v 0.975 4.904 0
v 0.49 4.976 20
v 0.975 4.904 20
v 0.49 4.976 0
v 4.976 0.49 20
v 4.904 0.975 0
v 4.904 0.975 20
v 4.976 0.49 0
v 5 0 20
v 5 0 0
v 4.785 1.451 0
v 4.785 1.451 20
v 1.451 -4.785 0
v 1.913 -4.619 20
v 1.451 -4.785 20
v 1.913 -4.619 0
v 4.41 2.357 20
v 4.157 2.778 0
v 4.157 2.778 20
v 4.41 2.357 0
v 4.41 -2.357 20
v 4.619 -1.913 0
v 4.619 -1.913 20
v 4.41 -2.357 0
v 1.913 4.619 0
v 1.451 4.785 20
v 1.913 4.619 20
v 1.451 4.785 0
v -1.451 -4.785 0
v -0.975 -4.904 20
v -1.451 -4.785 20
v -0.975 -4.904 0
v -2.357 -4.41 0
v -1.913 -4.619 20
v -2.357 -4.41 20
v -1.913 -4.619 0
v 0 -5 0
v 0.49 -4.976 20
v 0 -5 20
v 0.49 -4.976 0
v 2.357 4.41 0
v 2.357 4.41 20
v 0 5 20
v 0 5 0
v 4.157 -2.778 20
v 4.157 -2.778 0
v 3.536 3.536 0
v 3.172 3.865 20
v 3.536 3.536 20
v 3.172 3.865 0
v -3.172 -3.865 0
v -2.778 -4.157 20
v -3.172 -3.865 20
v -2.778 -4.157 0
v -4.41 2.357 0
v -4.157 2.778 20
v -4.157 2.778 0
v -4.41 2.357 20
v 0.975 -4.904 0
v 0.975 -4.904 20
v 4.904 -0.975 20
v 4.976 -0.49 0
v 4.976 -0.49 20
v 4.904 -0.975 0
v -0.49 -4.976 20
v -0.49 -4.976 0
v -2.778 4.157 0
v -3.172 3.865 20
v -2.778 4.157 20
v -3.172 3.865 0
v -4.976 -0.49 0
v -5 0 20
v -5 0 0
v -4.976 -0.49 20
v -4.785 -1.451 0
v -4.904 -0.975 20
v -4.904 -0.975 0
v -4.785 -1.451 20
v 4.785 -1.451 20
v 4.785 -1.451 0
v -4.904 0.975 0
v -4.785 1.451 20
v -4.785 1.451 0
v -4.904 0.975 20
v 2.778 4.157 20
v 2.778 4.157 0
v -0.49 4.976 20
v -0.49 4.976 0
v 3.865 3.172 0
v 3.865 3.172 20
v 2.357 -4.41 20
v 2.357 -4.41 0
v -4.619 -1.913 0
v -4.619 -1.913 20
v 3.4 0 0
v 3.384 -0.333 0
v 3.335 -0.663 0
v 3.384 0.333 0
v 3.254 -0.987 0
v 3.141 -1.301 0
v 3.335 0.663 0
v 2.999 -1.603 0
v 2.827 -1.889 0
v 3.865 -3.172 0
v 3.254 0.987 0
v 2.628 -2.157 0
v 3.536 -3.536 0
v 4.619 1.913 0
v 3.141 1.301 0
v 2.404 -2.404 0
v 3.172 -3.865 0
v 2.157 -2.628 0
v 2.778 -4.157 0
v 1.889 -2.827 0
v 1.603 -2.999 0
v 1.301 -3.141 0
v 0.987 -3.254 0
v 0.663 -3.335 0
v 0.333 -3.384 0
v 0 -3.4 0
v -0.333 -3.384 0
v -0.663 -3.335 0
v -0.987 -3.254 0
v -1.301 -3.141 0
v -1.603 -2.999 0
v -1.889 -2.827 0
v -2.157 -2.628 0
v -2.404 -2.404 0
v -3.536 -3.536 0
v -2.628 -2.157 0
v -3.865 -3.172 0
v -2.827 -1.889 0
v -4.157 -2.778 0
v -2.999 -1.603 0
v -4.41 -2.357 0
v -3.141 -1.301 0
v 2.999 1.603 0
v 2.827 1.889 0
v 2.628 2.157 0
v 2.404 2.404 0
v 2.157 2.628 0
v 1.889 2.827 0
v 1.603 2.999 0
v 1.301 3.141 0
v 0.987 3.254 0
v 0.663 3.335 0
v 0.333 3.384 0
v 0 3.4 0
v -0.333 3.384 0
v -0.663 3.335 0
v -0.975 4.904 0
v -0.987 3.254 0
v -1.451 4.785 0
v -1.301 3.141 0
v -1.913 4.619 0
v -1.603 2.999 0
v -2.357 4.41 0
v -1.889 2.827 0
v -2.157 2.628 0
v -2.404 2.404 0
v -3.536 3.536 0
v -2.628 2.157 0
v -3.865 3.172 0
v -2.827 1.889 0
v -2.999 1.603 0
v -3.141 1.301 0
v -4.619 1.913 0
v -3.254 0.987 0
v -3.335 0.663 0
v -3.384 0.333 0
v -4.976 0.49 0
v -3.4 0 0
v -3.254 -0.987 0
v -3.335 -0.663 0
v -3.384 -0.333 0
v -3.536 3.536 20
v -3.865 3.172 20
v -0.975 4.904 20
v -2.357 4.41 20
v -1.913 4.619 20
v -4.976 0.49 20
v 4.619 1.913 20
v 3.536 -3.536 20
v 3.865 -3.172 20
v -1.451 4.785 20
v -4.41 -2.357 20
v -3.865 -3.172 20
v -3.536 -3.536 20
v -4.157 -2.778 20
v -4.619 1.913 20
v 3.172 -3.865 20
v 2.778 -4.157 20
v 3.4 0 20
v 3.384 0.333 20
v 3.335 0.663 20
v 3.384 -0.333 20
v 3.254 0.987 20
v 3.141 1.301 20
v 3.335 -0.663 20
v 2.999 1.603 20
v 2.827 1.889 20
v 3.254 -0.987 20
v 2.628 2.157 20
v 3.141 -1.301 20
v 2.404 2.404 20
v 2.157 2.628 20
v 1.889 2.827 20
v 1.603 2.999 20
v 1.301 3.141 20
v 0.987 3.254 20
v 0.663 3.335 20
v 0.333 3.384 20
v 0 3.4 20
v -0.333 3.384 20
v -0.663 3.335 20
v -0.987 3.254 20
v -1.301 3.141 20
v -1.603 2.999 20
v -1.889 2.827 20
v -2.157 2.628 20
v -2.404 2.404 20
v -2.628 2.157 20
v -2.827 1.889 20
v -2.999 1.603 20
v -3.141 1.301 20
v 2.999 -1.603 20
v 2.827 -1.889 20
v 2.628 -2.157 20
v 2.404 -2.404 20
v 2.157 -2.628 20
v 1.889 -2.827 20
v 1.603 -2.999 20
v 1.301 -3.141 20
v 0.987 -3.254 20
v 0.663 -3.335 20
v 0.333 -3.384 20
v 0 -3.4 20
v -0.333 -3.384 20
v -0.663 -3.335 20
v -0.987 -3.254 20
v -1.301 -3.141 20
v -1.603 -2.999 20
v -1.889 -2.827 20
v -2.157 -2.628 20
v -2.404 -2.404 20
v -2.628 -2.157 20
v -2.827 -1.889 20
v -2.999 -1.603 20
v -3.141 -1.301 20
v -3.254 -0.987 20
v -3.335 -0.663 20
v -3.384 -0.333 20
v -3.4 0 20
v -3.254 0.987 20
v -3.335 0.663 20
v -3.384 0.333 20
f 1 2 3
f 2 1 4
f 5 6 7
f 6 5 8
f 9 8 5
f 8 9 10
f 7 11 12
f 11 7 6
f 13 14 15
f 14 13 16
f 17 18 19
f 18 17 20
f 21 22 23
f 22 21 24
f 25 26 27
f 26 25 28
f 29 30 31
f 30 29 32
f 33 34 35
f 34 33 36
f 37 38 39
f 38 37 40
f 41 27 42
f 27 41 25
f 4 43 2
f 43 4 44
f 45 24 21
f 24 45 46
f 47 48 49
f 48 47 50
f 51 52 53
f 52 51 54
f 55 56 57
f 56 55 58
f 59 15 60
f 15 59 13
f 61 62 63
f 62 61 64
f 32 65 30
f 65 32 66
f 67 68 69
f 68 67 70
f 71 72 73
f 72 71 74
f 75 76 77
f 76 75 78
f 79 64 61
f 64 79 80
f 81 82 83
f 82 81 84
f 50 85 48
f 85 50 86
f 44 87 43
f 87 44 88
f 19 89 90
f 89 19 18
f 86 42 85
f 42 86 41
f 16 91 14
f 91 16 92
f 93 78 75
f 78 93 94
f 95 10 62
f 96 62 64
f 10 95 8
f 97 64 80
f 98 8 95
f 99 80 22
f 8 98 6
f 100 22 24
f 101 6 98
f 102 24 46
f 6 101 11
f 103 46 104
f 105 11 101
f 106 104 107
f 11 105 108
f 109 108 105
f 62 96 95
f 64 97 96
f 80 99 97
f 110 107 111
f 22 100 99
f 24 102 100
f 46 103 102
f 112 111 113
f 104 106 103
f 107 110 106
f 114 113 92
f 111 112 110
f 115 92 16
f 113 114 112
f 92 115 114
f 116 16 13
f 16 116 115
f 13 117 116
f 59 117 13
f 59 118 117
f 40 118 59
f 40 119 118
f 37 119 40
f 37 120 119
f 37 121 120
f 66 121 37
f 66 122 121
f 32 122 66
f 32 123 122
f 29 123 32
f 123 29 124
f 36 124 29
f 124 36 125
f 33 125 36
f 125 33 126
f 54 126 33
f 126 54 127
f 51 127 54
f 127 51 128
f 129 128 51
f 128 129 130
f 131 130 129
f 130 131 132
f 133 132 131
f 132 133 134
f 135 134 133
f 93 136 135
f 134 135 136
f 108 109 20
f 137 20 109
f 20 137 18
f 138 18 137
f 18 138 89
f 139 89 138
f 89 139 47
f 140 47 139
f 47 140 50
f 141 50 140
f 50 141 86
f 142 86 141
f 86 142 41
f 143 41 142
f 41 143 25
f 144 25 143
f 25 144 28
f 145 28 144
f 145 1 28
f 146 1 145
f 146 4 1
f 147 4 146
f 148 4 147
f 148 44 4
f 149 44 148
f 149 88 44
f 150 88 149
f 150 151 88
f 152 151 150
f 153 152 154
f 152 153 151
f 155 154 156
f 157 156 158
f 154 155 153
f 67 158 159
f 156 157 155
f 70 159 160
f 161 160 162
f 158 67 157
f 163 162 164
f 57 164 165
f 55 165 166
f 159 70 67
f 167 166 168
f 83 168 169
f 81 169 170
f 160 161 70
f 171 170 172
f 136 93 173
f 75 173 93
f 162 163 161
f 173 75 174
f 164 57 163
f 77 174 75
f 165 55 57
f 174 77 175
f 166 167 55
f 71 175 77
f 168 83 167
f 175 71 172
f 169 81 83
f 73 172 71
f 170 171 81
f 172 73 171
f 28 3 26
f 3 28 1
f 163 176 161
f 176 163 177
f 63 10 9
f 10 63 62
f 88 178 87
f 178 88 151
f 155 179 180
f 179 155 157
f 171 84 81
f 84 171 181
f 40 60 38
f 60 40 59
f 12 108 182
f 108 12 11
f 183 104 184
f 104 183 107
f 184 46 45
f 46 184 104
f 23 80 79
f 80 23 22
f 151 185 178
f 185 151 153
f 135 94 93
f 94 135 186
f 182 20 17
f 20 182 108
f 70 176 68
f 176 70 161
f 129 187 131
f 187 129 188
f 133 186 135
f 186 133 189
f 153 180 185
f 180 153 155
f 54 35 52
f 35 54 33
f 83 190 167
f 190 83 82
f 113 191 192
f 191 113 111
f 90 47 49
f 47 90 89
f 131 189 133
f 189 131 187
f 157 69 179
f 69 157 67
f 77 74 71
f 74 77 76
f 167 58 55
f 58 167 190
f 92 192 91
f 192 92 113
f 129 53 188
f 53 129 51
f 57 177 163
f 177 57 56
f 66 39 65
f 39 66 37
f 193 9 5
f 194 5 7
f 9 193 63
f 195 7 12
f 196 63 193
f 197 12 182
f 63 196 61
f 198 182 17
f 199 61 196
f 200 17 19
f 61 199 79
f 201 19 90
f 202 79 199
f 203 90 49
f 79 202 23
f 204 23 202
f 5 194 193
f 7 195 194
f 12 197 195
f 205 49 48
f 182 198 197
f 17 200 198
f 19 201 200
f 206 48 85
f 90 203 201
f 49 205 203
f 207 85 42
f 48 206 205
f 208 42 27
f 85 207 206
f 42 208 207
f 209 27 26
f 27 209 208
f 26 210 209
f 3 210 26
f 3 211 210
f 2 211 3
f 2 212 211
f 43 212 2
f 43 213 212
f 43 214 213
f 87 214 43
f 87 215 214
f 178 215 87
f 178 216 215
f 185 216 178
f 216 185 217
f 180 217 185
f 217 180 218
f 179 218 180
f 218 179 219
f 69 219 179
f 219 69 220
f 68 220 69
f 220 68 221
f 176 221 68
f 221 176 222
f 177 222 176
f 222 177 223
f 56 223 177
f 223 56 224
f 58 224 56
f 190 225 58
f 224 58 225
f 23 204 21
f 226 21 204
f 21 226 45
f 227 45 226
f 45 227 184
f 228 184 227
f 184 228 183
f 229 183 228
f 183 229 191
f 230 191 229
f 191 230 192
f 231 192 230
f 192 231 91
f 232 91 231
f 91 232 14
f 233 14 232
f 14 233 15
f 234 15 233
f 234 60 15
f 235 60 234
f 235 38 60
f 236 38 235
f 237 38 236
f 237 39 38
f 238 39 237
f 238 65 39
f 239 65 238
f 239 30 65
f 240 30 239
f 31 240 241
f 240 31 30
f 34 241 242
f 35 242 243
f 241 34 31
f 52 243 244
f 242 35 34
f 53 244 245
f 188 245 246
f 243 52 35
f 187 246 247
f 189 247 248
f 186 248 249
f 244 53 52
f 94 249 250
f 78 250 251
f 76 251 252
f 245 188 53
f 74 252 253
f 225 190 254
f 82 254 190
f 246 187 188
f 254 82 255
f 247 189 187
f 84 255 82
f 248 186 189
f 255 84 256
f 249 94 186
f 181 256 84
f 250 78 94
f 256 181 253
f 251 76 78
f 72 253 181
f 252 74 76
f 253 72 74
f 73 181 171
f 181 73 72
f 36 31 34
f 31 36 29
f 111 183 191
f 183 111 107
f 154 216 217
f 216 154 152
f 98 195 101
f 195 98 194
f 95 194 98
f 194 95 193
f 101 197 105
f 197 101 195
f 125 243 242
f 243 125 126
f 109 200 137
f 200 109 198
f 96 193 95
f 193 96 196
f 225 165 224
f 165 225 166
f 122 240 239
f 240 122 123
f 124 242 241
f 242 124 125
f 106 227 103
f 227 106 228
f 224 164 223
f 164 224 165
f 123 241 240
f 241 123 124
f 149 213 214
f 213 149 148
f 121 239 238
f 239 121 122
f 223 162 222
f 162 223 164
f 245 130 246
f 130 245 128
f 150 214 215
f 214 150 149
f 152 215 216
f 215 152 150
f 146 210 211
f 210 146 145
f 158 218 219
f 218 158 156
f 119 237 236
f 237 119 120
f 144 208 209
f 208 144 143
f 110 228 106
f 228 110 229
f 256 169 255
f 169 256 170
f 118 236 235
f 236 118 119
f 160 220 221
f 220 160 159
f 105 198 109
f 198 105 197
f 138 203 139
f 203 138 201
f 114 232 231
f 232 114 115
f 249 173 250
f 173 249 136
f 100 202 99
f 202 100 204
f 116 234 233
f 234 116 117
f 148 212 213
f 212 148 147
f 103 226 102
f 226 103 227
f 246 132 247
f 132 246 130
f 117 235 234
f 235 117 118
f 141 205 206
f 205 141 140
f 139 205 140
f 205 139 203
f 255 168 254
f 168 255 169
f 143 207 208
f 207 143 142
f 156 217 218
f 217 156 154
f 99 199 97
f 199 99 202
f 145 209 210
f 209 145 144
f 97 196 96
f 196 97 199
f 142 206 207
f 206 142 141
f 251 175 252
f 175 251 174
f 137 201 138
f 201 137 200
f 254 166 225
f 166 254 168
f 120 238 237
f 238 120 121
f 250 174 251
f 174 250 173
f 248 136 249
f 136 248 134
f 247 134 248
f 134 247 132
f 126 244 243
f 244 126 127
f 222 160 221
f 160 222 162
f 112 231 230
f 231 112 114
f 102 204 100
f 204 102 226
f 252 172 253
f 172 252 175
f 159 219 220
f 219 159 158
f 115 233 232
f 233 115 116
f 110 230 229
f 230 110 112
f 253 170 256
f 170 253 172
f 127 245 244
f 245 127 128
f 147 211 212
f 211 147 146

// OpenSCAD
// Lab Funnel Design (Corrected)
// Units: millimetres
// Orientation: Upright, wide opening at top, rests on XY plane at z=0.

// --- Dimensions ---
// Spout (Tube)
$spout_outer_diameter = 10;
$spout_inner_diameter = 6.8; // 10 - 2*1.6
$spout_length = 20;

// Cone (Funnel)
$cone_bottom_diameter = 10; // Matches spout outer diameter at z=20
$cone_top_diameter = 60;
$cone_height = 30; // From z=20 to z=50

// Wall Thickness
$wall_thickness = 1.6;

// Resolution for curved surfaces
$fn = 64;

// --- Helper Functions ---
// Creates a hollow cylinder (tube)
module hollow_cylinder(outer_d, inner_d, h) {
    difference() {
        cylinder(h = h, d = outer_d, $fn = $fn);
        cylinder(h = h, d = inner_d, $fn = $fn);
    }
}

// Creates a hollow cone (frustum)
// bottom_d: diameter at the smaller end (z=0 relative to cone)
// top_d: diameter at the larger end (z=height relative to cone)
module hollow_cone(bottom_d, top_d, h) {
    difference() {
        // Outer Cone
        // Polygon defines the profile: width at y=0 is bottom_d, width at y=h is top_d
        linear_extrude(height = h, center = true, convexity = 3) {
            polygon(points = [
                [-bottom_d/2, 0], 
                [bottom_d/2, 0], 
                [top_d/2, h], 
                [-top_d/2, h]
            ]);
        }
        
        // Inner Cone (Hole)
        linear_extrude(height = h, center = true, convexity = 3) {
            polygon(points = [
                [-bottom_d/2, 0], 
                [bottom_d/2, 0], 
                [top_d/2, h], 
                [-top_d/2, h]
            ]);
        }
    }
}

// --- Main Assembly ---
// The funnel rests on the XY plane at z=0.
// The spout runs from z=0 to z=20.
// The cone runs from z=20 to z=50.

translate([0, 0, 0]) {
    // 1. Build the Spout (Tube)
    // Outer diameter 10mm, Inner 6.8mm, Height 20mm
    hollow_cylinder(
        outer_d = $spout_outer_diameter,
        inner_d = $spout_inner_diameter,
        h = $spout_length
    );

    // 2. Build the Cone (Funnel)
    // Positioned starting at z = $spout_length (20mm)
    // Bottom diameter (at z=20) = 10mm
    // Top diameter (at z=50) = 60mm
    translate([0, 0, $spout_length]) {
        hollow_cone(
            bottom_d = $cone_bottom_diameter,
            top_d = $cone_top_diameter,
            h = $cone_height
        );
    }
}
